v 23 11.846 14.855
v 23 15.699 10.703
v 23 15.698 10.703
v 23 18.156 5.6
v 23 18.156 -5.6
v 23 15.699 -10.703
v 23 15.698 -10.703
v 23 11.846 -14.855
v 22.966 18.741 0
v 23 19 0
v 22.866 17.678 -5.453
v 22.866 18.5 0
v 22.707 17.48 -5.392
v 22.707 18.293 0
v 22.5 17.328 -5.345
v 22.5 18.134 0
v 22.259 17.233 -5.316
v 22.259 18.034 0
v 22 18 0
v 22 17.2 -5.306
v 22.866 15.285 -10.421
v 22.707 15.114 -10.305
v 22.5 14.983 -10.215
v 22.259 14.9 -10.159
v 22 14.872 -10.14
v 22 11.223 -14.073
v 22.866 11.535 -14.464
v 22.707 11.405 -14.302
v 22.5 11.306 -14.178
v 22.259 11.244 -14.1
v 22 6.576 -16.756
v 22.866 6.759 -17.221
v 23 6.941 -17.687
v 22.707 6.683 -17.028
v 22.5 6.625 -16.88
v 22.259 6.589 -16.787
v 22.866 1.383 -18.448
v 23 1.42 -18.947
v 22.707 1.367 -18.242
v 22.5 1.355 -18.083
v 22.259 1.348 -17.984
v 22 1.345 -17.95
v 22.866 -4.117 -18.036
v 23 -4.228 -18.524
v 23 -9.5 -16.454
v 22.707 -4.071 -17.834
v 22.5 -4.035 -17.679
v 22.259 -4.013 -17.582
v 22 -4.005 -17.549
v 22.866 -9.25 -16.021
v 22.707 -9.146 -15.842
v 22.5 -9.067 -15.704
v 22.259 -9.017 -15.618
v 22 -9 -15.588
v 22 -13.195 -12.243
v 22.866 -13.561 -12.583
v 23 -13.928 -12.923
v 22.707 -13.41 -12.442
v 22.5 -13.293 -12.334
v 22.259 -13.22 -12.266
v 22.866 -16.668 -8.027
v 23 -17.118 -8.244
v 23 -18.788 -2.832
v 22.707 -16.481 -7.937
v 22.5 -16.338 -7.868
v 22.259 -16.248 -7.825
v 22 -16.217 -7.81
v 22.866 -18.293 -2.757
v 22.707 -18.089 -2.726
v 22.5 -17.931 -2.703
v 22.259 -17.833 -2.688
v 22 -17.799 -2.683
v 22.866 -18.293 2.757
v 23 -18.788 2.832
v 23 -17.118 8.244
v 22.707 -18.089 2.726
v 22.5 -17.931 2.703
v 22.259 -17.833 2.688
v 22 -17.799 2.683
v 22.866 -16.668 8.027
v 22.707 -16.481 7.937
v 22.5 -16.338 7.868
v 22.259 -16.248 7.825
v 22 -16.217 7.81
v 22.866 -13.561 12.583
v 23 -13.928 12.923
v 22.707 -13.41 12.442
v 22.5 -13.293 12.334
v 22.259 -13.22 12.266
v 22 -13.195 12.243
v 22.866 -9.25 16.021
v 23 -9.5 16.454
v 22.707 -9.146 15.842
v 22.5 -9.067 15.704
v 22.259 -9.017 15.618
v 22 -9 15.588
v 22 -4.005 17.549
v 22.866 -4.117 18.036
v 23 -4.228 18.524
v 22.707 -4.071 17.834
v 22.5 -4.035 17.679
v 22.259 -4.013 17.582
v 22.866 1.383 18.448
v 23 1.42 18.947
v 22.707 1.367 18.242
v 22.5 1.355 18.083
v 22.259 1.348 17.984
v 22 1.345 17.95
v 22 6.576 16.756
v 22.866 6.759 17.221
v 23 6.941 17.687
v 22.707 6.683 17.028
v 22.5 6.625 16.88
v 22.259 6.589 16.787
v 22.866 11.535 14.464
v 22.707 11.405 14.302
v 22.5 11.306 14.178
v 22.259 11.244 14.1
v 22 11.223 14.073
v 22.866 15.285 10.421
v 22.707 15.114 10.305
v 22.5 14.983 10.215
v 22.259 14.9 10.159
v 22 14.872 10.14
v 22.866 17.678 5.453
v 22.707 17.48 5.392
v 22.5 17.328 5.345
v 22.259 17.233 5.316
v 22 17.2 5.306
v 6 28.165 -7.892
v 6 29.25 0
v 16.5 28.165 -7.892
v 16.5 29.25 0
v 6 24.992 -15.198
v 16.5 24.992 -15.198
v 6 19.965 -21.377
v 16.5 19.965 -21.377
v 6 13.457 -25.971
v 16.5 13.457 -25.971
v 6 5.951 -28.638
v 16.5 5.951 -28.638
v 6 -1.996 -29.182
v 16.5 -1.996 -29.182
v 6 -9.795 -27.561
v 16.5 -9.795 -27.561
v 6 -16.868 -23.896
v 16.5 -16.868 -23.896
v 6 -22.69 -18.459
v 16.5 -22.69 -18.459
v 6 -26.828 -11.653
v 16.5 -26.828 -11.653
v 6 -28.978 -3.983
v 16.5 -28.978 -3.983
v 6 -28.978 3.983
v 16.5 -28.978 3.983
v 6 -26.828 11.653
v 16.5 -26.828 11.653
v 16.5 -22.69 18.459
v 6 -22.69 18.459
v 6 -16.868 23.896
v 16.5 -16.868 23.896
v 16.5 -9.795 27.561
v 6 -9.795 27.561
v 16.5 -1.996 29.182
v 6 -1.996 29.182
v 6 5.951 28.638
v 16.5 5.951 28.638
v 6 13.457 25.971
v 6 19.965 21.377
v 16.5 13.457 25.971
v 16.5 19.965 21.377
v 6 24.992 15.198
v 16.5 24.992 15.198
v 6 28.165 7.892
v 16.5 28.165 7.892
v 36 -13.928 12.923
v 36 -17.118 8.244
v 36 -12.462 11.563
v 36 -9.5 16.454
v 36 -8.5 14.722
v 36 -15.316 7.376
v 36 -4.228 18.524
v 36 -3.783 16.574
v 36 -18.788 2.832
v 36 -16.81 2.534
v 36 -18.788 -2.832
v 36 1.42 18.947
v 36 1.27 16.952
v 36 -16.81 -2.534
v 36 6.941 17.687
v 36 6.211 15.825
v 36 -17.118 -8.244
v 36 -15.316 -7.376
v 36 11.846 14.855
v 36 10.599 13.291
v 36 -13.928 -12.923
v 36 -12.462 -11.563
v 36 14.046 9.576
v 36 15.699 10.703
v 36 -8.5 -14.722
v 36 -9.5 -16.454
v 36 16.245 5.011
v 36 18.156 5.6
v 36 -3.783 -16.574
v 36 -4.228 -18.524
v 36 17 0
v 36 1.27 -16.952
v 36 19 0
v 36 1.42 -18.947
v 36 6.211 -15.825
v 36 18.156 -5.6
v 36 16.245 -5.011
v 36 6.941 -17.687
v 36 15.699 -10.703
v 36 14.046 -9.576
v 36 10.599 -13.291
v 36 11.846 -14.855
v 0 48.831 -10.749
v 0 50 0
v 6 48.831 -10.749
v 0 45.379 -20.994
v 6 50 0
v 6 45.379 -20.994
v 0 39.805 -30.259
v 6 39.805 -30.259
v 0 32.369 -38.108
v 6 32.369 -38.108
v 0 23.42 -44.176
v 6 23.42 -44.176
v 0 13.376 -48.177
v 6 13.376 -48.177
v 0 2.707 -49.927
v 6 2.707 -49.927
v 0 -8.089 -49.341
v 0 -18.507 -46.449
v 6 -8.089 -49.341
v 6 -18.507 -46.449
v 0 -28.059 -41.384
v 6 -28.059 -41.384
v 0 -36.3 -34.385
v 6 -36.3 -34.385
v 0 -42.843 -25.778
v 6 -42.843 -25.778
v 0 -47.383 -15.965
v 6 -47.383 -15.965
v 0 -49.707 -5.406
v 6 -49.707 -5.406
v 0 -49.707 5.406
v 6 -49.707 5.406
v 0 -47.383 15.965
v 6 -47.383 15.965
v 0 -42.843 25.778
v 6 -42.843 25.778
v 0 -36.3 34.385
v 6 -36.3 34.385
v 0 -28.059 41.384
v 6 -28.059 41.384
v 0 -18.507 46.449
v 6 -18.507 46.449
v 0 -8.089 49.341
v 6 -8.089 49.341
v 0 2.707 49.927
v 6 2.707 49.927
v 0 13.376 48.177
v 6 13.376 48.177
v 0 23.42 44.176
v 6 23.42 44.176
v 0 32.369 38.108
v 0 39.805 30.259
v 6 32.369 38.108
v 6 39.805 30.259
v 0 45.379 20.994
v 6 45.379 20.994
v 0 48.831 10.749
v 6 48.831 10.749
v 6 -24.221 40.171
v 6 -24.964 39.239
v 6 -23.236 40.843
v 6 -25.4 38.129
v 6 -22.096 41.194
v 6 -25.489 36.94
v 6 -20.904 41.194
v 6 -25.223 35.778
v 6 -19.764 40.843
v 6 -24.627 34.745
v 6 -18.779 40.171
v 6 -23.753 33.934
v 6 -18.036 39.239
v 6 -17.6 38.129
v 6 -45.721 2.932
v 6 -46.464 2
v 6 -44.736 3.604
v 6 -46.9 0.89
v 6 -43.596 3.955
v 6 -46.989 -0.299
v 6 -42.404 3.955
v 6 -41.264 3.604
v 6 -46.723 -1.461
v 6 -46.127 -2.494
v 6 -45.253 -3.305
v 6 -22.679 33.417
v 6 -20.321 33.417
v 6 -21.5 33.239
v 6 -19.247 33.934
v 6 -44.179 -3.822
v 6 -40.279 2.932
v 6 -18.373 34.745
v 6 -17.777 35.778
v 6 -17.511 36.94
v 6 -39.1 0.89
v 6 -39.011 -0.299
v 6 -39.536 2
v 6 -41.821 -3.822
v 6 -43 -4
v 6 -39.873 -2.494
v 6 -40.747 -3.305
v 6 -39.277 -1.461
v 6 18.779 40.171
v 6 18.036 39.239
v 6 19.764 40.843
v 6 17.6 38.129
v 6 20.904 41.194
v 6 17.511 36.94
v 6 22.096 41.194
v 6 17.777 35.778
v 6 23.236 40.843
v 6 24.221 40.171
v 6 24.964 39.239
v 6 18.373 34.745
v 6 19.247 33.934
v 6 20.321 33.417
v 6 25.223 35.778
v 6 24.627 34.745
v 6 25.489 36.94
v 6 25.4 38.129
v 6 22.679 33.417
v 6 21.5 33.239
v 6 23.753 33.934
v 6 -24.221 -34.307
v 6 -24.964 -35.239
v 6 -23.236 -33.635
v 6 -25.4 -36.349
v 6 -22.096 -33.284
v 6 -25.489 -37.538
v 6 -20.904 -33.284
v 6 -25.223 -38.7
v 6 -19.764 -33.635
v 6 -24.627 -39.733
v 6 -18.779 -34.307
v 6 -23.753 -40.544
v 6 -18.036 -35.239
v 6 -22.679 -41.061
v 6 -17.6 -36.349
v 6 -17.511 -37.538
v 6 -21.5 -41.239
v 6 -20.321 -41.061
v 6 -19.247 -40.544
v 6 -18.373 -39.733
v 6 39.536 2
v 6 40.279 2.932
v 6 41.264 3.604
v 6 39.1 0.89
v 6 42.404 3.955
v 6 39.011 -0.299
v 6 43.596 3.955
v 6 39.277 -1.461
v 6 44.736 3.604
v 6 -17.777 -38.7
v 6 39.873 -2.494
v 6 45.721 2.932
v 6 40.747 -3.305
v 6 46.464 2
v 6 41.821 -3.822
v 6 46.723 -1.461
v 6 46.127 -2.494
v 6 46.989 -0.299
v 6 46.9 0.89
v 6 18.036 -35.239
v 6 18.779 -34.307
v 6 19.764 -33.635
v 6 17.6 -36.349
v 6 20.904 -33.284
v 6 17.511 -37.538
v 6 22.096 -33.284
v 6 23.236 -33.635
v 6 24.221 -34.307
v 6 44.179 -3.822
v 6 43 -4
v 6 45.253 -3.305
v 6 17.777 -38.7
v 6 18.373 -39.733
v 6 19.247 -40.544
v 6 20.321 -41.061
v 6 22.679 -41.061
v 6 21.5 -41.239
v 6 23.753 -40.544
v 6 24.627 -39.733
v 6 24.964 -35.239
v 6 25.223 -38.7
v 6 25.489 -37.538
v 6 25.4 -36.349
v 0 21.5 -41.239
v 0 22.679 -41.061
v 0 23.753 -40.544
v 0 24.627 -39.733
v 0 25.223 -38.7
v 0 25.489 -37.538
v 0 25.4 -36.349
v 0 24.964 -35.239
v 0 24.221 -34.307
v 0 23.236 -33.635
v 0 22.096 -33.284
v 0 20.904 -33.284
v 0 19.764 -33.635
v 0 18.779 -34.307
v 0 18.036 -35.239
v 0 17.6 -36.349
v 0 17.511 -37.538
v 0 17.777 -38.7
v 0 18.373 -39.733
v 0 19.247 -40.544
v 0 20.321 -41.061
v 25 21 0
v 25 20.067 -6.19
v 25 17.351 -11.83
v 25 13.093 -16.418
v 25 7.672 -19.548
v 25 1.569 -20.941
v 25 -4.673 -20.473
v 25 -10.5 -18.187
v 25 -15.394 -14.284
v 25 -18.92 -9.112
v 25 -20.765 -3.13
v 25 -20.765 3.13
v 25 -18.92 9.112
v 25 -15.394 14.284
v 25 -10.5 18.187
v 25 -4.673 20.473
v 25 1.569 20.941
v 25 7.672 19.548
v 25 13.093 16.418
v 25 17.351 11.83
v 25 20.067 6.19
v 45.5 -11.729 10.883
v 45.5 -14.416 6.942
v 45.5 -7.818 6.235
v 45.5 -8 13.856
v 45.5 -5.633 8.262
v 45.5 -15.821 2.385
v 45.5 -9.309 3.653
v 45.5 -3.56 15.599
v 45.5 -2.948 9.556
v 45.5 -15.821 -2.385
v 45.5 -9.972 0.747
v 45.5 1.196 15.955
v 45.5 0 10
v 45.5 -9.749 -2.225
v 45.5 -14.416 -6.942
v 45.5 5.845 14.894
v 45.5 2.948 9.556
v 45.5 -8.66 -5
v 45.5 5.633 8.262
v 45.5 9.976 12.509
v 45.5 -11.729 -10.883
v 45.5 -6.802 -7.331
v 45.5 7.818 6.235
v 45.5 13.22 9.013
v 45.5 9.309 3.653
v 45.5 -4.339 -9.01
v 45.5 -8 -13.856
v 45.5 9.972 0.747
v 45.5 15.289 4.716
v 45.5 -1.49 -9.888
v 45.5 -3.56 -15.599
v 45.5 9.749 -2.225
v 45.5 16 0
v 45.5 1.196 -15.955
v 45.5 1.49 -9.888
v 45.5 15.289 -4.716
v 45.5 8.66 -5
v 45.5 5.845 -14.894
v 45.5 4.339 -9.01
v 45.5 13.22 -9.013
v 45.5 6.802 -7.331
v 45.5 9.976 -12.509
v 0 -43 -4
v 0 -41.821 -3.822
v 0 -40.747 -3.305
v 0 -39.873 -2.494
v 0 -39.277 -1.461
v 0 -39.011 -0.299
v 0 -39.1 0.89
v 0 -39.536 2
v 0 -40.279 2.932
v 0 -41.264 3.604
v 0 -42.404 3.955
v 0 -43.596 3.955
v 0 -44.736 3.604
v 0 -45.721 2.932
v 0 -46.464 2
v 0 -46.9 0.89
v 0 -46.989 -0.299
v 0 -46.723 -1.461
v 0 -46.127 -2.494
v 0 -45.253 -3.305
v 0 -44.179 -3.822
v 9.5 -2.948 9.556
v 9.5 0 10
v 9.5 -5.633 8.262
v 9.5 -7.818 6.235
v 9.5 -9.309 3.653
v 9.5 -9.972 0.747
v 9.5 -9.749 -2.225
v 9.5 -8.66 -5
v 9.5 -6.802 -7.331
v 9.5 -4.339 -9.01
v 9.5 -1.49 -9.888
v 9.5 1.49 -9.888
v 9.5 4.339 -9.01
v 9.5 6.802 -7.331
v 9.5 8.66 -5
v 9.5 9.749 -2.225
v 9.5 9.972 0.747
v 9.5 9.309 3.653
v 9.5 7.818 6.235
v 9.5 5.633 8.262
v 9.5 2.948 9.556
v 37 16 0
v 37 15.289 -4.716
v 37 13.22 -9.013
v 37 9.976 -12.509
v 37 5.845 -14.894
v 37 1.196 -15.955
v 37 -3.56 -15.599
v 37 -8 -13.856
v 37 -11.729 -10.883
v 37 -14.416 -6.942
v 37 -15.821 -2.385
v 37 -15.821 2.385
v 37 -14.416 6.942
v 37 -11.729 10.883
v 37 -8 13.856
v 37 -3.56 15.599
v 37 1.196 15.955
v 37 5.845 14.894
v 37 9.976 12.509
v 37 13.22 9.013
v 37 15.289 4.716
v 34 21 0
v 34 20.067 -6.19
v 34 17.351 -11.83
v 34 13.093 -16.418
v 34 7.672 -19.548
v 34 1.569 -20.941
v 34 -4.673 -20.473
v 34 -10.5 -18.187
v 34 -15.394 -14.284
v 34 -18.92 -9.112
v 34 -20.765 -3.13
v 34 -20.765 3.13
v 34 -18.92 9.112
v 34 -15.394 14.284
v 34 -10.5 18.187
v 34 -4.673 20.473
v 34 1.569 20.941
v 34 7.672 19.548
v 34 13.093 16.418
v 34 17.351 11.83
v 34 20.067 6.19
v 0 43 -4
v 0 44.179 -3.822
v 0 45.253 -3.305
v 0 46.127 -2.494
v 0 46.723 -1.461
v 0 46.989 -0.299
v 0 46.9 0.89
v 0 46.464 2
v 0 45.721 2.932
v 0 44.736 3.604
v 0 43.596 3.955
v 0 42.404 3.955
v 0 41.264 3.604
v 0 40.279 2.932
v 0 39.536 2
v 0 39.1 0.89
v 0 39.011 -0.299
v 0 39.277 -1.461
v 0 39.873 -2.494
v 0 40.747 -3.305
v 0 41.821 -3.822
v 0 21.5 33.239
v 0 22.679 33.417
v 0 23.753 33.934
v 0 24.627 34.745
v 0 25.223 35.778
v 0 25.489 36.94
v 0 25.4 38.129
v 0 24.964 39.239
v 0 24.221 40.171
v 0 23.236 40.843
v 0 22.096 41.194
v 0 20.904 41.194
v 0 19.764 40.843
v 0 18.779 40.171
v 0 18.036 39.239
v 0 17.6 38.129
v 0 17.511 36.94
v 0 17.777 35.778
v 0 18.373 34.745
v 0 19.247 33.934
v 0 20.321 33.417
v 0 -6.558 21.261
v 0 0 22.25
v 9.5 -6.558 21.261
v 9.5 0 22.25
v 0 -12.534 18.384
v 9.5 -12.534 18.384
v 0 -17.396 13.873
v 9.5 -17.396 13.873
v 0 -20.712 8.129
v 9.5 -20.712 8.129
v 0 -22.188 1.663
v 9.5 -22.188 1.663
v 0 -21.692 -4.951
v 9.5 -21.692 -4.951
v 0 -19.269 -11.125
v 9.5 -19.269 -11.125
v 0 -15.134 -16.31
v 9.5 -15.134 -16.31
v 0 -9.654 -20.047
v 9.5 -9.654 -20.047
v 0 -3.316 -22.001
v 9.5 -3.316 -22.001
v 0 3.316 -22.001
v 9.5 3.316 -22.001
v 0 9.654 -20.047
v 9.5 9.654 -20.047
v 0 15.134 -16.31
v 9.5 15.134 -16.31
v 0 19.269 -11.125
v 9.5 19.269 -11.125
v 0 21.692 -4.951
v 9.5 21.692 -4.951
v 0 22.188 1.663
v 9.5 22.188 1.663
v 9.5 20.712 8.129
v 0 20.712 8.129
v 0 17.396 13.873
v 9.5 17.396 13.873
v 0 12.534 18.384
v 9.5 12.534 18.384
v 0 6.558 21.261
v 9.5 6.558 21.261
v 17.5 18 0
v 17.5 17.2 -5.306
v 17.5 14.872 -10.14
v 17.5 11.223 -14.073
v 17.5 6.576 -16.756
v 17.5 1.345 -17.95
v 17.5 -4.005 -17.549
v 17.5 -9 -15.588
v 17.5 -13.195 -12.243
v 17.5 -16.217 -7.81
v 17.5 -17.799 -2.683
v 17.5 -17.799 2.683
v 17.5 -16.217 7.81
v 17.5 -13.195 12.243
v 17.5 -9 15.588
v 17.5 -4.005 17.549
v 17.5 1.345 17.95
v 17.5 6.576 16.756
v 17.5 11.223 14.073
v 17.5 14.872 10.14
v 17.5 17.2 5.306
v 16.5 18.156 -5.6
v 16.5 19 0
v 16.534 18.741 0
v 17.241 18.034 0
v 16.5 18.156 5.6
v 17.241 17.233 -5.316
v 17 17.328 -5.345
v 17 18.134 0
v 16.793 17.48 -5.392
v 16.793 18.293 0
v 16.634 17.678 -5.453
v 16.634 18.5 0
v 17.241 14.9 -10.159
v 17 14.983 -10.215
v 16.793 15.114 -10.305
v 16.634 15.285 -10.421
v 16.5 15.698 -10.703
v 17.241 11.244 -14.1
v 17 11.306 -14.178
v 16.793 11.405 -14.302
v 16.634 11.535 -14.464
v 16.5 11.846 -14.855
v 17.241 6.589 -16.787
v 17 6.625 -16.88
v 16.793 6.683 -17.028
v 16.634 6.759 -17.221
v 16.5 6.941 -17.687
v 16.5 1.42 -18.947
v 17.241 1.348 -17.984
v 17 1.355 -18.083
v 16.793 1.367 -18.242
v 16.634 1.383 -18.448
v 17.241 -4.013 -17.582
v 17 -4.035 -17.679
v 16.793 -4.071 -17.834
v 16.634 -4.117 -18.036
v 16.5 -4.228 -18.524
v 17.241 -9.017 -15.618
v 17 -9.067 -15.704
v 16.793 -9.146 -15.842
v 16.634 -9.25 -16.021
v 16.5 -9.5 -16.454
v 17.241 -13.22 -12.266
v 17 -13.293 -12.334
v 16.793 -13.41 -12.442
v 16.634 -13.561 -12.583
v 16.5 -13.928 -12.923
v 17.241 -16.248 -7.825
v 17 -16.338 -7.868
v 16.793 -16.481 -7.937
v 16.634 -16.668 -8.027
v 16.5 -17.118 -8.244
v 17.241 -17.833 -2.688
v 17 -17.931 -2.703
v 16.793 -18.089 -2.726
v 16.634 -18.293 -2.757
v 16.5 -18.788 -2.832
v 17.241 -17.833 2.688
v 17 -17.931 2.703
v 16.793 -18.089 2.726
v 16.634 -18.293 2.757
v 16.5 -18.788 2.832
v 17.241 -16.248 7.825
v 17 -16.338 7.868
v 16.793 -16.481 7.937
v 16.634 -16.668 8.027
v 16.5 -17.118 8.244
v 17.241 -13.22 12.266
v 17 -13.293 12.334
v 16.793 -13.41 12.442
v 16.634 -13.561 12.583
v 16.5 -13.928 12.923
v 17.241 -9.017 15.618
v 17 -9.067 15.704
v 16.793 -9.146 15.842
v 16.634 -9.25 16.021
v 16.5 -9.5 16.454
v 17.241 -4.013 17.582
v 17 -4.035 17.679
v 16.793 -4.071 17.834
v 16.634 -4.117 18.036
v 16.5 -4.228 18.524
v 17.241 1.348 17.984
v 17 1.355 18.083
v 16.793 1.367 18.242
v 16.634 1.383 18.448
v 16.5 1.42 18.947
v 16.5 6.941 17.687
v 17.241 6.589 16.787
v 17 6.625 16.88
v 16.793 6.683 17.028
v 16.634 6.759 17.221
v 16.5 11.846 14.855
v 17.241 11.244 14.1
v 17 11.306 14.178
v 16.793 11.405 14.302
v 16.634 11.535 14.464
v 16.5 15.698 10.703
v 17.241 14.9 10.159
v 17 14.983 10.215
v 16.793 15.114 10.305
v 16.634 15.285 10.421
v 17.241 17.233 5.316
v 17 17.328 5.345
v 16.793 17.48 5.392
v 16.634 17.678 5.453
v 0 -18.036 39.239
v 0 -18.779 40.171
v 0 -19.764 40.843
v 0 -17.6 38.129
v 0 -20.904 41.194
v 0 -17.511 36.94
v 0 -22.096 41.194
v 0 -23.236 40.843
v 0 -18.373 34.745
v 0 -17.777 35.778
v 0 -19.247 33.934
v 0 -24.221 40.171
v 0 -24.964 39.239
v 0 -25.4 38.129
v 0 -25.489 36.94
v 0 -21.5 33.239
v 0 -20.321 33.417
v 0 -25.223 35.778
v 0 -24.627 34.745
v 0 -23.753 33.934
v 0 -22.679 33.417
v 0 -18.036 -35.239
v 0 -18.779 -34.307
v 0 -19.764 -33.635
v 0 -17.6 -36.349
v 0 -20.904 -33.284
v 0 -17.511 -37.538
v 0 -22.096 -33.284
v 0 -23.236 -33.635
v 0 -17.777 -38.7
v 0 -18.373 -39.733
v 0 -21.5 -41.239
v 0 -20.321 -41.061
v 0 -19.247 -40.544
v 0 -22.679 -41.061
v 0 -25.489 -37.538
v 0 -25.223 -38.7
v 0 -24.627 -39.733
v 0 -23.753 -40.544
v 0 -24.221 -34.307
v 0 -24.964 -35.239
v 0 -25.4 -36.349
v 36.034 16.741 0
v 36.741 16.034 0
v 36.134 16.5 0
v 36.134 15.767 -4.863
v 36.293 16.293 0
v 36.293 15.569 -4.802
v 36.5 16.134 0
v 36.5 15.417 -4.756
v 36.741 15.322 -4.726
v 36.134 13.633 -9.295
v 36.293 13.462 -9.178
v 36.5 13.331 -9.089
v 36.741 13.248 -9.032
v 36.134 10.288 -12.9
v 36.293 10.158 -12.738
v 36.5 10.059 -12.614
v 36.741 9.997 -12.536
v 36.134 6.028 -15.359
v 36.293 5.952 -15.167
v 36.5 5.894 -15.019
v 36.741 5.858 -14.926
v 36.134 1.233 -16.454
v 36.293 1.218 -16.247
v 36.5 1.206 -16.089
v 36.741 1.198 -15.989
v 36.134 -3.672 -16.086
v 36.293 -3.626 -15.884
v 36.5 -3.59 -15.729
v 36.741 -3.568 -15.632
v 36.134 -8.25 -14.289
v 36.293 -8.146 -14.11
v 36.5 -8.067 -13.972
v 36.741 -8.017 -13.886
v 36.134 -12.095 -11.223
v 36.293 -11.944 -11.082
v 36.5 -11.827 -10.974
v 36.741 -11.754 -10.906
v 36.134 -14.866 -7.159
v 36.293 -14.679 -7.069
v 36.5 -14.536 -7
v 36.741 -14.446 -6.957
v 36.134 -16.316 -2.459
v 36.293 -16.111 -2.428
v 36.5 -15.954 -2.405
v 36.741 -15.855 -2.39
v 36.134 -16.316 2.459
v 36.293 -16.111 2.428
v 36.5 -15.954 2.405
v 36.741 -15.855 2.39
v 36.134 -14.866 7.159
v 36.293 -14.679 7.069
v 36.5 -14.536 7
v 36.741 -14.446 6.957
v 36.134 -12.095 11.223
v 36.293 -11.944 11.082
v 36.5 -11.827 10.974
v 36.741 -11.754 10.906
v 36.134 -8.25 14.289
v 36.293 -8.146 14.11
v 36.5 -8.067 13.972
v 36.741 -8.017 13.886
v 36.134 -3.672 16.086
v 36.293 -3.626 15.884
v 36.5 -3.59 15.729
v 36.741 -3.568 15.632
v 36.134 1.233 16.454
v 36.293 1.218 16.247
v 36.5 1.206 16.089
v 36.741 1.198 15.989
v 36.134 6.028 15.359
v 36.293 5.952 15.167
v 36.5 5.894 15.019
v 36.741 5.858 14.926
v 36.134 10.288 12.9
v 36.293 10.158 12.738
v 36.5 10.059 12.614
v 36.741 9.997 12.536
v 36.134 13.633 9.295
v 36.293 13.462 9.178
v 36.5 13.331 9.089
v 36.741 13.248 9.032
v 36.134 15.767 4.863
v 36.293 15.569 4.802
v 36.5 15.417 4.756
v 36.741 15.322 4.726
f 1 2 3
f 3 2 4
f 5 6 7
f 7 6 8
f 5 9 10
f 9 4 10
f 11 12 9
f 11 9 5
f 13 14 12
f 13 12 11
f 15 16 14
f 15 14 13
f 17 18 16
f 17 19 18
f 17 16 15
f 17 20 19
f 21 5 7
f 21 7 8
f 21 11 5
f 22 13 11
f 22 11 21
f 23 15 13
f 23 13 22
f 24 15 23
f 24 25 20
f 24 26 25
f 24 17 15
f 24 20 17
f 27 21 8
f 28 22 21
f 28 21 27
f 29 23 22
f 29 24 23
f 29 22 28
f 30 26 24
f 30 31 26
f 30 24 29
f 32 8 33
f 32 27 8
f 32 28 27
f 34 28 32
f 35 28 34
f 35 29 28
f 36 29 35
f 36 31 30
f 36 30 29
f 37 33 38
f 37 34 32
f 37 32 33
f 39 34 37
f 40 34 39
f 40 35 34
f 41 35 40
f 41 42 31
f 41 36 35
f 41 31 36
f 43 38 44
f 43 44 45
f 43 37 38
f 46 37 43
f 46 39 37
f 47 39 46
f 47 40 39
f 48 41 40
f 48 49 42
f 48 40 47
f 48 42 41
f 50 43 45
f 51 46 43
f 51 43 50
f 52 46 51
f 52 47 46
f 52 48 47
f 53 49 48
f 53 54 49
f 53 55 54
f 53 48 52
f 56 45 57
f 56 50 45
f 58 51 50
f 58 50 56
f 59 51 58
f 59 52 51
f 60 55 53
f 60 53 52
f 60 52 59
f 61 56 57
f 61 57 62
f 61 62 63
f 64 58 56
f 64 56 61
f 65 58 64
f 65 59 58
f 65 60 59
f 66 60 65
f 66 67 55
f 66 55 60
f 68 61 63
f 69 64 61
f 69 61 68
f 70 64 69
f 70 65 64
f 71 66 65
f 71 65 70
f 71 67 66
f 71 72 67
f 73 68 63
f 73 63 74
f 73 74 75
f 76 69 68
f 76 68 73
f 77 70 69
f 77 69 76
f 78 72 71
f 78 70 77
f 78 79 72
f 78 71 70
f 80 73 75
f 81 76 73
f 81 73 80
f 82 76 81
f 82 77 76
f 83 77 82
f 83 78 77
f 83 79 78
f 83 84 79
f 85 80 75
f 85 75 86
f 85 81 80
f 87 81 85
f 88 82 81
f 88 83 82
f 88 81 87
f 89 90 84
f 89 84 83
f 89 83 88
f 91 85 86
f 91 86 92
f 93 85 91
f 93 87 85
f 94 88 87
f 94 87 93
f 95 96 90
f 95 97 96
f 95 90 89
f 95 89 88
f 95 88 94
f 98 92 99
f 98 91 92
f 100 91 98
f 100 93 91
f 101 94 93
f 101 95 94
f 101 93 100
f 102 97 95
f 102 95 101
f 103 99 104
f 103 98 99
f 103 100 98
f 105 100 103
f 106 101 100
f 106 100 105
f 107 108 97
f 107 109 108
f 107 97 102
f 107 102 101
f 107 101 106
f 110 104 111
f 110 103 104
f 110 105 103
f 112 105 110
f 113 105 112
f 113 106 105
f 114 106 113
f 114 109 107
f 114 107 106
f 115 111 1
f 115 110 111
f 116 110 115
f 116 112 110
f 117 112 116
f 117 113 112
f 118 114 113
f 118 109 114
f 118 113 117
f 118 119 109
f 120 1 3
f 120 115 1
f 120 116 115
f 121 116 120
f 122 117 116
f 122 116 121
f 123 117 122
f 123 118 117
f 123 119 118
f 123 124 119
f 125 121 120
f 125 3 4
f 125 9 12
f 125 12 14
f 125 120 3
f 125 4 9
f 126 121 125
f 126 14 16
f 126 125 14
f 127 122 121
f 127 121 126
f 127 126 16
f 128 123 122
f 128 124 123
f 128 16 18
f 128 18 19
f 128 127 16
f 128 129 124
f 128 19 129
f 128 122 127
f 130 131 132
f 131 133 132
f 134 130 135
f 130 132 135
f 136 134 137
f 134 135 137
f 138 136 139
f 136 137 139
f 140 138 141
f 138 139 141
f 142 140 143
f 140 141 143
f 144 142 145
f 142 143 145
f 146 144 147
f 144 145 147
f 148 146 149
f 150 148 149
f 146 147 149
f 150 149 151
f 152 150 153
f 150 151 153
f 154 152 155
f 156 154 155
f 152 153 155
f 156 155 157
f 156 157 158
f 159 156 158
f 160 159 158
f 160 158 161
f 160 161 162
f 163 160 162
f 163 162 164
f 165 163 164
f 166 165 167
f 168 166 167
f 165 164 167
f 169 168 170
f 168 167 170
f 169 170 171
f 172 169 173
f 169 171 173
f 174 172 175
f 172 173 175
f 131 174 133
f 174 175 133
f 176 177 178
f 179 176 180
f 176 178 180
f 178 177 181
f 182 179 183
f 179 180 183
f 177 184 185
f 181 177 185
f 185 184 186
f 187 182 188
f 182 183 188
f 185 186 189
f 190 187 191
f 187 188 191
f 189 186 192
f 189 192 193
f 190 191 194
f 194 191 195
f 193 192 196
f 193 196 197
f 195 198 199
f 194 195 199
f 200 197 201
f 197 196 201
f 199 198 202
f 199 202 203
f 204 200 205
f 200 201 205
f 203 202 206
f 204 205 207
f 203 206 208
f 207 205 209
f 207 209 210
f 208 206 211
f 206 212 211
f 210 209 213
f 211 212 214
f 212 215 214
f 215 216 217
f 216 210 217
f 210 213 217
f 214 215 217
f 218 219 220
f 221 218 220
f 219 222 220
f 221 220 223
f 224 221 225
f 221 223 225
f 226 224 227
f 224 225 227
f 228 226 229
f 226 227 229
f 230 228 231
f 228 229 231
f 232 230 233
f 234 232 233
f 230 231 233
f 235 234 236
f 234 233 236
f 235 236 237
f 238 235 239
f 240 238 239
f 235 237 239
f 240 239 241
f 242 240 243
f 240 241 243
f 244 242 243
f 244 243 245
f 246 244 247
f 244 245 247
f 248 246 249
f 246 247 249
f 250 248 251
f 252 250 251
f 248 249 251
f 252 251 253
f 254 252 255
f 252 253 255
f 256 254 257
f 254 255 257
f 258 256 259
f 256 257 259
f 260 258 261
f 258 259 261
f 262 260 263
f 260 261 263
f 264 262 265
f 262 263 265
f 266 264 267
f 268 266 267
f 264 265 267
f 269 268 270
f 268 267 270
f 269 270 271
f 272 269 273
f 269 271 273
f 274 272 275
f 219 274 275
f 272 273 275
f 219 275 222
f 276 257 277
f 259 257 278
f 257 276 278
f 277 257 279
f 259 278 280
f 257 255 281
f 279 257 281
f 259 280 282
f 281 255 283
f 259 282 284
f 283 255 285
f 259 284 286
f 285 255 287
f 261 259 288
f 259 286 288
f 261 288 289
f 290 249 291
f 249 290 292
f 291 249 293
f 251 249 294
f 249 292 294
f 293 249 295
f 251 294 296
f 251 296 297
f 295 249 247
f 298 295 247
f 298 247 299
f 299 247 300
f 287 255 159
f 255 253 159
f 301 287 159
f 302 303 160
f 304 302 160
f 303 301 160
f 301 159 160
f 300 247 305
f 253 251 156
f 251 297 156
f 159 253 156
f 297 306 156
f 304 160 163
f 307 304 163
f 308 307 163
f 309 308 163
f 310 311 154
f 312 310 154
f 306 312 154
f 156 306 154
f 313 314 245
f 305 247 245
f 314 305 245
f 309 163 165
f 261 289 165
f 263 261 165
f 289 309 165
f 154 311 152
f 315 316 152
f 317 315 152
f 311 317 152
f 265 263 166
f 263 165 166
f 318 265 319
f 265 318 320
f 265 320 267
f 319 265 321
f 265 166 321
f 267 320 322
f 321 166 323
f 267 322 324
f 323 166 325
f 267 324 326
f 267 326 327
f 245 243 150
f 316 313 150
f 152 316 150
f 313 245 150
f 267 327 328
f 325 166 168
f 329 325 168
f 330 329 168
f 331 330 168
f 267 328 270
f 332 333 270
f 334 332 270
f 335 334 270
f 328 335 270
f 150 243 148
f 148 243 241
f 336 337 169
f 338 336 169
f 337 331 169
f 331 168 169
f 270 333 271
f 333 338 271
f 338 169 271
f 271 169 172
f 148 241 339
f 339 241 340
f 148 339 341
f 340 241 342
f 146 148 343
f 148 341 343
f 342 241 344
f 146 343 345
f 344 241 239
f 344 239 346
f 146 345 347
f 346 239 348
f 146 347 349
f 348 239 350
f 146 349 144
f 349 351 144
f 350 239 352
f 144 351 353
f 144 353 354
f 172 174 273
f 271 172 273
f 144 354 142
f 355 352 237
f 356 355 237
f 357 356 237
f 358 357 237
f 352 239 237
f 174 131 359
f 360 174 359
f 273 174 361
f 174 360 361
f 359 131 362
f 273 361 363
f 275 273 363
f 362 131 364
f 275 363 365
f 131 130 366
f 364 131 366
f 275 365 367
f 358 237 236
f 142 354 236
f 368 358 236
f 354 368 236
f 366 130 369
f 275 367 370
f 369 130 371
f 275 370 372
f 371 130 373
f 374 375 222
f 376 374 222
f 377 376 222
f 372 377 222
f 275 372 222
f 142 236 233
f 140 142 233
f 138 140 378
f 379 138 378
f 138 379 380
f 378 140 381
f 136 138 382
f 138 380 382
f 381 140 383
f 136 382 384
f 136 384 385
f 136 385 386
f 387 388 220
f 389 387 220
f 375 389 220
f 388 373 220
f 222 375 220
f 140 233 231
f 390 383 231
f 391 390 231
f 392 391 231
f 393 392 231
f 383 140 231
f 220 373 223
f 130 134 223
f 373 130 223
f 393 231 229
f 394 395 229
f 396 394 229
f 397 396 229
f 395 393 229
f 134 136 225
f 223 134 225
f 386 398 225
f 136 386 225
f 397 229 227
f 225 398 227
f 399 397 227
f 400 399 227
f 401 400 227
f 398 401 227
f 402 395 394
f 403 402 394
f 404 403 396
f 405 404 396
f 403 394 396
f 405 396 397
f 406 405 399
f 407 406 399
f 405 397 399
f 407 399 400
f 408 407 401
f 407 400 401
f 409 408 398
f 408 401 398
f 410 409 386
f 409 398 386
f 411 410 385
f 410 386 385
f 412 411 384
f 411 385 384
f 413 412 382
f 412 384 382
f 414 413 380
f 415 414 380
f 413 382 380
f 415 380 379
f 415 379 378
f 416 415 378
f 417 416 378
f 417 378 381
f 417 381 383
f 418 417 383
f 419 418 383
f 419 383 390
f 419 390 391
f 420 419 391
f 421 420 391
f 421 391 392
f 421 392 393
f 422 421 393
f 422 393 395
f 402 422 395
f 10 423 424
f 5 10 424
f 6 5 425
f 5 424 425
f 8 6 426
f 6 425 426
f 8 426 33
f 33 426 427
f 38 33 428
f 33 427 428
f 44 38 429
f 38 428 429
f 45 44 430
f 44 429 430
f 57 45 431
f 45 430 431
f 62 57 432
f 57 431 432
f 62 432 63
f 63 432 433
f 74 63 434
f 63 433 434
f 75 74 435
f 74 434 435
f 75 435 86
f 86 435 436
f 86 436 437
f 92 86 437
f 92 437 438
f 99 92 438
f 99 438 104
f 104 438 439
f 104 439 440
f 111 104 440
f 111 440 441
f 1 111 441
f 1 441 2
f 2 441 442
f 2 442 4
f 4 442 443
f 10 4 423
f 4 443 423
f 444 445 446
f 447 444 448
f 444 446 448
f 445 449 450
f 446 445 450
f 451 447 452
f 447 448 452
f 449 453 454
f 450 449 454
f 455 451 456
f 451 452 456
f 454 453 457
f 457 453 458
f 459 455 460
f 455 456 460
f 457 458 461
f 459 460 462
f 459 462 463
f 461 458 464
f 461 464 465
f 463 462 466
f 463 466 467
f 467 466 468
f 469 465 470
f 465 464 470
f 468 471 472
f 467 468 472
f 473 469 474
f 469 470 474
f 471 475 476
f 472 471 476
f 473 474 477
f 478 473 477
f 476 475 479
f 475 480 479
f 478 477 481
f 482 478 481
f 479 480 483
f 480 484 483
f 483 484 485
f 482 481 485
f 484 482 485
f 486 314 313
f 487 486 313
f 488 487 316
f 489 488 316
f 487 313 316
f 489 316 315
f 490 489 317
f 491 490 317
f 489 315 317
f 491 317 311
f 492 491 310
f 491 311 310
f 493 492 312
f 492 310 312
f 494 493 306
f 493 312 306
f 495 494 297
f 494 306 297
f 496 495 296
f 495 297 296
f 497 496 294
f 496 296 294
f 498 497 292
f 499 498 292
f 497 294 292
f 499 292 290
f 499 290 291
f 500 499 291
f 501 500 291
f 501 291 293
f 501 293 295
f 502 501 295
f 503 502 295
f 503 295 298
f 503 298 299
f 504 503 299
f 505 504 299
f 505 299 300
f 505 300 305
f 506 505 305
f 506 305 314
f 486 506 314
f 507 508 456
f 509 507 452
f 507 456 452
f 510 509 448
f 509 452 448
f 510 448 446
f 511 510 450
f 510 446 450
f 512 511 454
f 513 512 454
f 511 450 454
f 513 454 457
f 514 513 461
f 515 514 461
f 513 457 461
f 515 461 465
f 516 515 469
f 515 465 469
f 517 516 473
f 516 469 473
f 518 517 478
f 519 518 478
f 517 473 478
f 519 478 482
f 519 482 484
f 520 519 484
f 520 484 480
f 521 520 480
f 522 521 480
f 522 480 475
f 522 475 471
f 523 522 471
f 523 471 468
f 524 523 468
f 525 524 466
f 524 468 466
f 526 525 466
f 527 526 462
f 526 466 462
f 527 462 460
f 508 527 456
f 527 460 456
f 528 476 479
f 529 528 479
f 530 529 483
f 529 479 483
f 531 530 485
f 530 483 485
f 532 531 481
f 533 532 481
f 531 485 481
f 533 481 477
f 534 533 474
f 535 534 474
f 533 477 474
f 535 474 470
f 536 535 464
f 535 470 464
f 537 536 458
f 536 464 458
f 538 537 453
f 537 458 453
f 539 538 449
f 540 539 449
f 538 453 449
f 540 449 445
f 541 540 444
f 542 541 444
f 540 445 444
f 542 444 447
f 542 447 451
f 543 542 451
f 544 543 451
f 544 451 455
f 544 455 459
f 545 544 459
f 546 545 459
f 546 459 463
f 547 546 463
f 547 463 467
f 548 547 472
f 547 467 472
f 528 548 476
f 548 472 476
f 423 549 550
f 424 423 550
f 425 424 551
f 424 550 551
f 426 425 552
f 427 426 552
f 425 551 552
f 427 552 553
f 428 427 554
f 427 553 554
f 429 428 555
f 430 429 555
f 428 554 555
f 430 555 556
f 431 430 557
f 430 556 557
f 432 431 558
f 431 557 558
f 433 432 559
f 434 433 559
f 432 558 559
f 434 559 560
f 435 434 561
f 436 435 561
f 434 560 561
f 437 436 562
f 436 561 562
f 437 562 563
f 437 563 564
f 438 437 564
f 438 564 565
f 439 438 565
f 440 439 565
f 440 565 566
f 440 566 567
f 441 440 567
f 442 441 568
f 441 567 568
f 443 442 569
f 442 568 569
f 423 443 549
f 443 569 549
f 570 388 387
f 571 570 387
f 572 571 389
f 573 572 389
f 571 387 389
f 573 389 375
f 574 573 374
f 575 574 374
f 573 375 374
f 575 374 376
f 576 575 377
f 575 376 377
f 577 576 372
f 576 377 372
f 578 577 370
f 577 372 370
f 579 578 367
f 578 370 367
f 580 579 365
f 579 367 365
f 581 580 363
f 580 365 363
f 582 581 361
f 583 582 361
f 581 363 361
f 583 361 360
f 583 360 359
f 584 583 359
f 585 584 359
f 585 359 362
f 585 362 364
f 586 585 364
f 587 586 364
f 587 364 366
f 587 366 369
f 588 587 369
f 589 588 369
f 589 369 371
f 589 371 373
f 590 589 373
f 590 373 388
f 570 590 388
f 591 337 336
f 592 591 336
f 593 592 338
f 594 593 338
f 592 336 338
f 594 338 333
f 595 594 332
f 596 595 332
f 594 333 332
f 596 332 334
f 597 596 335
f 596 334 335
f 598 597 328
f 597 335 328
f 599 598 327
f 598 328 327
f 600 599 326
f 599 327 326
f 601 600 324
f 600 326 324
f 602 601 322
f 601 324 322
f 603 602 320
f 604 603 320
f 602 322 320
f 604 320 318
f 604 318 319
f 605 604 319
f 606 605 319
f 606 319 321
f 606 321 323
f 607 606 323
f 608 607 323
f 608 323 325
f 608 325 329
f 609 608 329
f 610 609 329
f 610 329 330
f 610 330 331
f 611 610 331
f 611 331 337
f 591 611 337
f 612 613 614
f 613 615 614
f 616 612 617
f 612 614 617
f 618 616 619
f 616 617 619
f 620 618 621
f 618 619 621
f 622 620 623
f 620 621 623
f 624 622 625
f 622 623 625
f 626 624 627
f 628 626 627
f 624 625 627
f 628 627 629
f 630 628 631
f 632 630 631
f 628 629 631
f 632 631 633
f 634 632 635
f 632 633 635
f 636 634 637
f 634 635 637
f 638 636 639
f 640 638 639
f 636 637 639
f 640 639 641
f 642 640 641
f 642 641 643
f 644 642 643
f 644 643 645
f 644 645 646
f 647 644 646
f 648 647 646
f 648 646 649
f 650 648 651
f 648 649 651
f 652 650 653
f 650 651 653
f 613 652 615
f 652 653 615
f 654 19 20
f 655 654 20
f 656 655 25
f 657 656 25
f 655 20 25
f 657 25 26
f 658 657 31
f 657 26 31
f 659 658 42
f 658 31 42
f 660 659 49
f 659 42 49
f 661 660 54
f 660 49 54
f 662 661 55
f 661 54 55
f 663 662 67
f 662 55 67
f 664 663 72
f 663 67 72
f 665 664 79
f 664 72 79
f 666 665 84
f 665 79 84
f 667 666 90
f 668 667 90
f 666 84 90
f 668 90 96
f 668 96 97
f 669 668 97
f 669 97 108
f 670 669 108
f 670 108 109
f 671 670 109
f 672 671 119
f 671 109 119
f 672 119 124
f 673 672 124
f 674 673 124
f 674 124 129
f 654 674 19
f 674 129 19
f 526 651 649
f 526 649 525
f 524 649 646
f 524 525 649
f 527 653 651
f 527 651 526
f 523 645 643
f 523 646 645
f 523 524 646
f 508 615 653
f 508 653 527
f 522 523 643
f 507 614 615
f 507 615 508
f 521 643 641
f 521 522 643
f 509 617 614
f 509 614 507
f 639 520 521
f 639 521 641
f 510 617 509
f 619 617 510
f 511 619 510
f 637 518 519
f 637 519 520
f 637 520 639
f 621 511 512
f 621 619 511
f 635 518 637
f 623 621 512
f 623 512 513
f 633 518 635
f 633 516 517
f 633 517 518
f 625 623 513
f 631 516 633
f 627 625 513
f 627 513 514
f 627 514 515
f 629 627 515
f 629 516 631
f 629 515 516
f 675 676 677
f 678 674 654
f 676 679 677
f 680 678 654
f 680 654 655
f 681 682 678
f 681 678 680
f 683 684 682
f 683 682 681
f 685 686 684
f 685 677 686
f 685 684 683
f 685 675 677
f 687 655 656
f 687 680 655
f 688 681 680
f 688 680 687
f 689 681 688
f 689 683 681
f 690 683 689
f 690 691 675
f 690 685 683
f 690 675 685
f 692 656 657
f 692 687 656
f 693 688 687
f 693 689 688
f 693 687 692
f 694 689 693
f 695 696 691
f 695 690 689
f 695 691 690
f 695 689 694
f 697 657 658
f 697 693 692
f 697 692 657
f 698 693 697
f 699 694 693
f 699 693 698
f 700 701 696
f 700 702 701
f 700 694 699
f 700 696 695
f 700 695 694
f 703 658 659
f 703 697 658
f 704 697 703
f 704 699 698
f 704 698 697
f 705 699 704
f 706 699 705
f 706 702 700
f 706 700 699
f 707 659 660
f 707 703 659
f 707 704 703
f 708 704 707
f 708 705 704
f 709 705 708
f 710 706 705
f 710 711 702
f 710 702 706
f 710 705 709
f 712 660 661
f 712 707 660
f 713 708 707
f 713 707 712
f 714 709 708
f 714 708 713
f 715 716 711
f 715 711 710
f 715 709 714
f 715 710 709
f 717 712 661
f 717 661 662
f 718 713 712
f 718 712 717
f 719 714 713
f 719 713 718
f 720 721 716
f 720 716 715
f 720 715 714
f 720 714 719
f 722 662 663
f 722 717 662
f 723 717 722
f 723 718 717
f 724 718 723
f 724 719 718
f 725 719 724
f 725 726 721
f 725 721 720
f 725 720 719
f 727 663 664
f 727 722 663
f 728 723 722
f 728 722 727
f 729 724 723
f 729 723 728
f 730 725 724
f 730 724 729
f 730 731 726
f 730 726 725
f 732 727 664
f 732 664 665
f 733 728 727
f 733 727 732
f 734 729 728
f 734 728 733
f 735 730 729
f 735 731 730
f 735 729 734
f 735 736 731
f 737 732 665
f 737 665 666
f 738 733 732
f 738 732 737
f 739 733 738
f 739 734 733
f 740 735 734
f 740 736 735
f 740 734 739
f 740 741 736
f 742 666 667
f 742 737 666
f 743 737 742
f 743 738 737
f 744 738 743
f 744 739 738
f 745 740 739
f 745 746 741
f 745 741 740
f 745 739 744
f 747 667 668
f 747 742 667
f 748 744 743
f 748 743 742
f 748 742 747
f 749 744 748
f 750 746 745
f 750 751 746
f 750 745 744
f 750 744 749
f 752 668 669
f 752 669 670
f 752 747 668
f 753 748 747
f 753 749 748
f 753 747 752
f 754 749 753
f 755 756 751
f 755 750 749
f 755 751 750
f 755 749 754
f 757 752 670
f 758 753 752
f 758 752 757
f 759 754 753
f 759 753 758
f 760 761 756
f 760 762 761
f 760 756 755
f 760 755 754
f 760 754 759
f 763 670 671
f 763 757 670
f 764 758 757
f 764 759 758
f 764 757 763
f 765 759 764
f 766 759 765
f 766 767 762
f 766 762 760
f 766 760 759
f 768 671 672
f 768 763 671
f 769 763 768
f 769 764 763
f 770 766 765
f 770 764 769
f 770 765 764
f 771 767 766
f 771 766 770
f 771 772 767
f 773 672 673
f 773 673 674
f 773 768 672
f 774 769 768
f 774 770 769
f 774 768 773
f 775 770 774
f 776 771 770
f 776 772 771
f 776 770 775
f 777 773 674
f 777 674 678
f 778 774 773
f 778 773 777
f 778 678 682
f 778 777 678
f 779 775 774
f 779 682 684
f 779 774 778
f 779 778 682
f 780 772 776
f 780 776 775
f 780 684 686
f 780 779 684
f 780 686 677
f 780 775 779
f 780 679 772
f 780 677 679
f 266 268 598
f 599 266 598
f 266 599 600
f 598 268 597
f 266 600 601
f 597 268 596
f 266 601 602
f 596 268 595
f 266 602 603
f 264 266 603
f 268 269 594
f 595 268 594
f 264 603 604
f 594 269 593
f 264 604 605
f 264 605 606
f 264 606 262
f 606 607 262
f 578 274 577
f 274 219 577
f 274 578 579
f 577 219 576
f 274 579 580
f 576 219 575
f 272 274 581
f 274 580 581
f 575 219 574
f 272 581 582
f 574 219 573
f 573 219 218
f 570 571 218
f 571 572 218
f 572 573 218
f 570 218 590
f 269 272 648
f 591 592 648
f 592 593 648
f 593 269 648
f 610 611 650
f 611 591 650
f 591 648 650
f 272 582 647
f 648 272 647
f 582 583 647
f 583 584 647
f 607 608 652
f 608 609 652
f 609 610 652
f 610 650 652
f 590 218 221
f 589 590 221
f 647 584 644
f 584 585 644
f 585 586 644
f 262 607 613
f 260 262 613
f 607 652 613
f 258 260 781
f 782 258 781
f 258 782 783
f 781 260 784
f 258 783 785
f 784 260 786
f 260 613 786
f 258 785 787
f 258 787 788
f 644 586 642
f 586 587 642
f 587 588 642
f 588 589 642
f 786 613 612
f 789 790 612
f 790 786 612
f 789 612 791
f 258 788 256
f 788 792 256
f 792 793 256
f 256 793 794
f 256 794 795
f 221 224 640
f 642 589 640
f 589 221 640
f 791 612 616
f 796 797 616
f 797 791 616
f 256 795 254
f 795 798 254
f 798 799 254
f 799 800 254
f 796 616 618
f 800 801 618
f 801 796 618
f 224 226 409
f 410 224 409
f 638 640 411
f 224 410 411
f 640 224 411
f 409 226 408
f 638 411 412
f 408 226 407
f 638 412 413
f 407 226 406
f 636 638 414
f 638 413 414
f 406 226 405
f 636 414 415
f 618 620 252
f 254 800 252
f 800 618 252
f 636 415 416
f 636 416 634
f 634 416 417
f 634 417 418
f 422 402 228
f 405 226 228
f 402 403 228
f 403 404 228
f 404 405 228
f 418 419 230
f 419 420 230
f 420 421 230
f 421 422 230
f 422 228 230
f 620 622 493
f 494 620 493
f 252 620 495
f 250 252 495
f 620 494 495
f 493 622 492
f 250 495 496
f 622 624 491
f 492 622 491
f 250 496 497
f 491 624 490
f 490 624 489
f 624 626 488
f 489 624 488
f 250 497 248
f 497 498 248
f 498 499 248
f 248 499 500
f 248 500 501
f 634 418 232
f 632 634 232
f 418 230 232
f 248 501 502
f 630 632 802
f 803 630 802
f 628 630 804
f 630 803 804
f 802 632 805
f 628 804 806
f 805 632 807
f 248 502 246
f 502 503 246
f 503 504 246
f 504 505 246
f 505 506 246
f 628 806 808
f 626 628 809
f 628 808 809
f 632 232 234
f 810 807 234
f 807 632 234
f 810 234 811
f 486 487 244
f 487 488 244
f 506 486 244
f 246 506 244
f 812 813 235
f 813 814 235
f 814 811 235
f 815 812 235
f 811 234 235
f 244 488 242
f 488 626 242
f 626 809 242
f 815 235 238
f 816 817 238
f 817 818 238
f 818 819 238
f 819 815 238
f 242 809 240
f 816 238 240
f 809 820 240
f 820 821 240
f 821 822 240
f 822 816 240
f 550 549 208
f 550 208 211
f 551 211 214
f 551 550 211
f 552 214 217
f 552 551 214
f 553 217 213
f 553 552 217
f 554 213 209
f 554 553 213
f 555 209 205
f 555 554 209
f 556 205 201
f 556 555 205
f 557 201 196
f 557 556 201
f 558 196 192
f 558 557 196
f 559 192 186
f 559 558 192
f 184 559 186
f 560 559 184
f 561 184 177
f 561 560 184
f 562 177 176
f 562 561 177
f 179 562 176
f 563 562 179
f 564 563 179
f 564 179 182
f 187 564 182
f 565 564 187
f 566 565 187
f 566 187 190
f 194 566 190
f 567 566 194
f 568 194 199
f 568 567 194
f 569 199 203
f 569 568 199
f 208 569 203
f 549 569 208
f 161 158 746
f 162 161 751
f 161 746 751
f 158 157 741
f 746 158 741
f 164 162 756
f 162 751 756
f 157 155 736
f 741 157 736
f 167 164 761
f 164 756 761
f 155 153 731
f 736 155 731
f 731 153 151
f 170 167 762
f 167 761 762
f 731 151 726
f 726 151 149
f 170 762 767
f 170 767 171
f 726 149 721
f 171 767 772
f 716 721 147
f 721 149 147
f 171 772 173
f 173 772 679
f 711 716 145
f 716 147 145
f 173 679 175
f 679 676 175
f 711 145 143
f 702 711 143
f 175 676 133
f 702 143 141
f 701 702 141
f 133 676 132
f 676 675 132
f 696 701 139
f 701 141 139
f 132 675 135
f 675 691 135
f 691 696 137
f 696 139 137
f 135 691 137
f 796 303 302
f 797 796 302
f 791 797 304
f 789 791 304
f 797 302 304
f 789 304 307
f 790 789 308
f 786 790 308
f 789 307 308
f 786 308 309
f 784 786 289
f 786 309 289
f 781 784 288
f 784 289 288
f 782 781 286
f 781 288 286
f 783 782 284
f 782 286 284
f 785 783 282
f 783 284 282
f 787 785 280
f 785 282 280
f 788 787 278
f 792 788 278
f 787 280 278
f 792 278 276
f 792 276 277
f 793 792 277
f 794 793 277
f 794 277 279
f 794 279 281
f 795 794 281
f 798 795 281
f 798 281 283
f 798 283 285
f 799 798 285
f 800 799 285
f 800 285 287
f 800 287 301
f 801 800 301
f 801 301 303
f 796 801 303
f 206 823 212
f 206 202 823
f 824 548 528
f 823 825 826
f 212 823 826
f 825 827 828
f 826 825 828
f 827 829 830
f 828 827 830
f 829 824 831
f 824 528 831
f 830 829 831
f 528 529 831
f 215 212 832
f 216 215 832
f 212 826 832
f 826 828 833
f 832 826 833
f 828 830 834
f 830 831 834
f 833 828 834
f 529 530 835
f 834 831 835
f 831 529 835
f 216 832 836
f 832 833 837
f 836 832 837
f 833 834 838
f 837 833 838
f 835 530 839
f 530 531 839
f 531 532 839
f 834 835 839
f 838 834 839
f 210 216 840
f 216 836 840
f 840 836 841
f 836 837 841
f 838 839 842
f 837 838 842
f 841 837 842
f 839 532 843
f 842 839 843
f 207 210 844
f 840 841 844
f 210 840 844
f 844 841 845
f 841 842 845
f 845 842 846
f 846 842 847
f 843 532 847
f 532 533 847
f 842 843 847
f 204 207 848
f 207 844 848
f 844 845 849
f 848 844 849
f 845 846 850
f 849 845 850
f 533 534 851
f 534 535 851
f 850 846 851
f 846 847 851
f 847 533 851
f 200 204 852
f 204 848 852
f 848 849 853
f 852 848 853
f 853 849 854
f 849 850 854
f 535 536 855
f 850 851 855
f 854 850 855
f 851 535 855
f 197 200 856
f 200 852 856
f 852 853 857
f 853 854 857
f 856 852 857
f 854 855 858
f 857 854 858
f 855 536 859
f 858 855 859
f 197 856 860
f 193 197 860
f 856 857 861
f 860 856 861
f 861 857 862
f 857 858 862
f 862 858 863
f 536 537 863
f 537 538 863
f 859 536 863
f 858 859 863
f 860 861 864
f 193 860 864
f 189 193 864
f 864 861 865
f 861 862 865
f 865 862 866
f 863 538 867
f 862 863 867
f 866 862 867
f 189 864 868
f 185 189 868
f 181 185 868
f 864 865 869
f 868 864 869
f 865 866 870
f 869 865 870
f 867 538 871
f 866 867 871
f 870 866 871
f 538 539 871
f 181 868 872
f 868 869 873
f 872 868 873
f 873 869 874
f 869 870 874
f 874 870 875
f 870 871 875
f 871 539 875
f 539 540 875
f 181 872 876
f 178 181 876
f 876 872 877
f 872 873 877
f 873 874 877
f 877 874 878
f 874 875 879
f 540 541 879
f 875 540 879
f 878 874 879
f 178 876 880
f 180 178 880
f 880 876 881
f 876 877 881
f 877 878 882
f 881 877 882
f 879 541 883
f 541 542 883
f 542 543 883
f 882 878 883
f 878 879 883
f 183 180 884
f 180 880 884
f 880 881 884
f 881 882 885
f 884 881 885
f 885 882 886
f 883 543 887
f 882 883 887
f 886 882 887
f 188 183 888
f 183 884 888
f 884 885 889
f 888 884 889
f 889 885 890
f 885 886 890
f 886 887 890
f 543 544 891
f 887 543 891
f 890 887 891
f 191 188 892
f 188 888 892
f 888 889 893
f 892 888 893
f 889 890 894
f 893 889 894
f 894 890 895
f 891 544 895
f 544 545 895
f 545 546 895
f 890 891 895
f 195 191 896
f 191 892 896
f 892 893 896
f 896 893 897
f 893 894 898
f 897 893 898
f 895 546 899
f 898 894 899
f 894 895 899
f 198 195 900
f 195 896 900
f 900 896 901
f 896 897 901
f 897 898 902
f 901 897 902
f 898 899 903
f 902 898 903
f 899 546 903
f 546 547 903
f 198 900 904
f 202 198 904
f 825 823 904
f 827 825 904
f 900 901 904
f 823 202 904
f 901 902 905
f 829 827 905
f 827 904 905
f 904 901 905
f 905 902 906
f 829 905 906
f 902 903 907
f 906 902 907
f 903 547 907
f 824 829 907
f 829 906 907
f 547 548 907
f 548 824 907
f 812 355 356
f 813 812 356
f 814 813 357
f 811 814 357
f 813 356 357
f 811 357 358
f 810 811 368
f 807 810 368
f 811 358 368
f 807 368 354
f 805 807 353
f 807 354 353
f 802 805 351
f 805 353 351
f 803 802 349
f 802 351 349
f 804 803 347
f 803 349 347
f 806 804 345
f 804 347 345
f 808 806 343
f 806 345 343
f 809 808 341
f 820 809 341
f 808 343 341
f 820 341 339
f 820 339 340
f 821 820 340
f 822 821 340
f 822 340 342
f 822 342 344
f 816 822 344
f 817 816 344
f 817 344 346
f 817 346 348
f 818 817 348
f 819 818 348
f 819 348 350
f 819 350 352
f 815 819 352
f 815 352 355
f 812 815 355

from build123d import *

# Parameters (mm, degrees)
SKETCH2_W     = 9.5
SKETCH2_H     = 22.25
SKETCH2_W_2   = 36
SKETCH2_H_2   = 10
HOLE1_D       = 8
CHAMFER1_SIZE = 2
FILLET1_R     = 1


with BuildPart() as part:
    # Sketch1 → Revolve1 (revolve)
    with BuildSketch(Plane.XY):
        Polygon((0, 0), (0, 50), (6, 50), (6, 29.25), (16.5, 29.25), (16.5, 18), (23, 18), (23, 21), (36, 21), (36, 16), (45.5, 16), (45.5, 0), align=None)
    revolve(axis=Axis((45.5, 0, 0), (-1, 0, 0)))

    # Sketch2 → Cut-Revolve1 (revolve, cut)
    with BuildSketch(Plane.XY, mode=Mode.PRIVATE) as cut_revolve1_sk:
        with Locations((4.75, 11.125)):
            Rectangle(SKETCH2_W, SKETCH2_H)
        with Locations((27.5, 5)):
            Rectangle(SKETCH2_W_2, SKETCH2_H_2)
    revolve(cut_revolve1_sk.sketch.rotate(Axis((0, 0, 0), (1, 0, 0)), 90), axis=Axis((0, 0, 0), (1, 0, 0)), mode=Mode.SUBTRACT)

    # Hole1 (through all)
    with Locations(Plane.ZY):
        with Locations((0, 0), (0, 43), (37.239092363, 21.5), (37.239092363, -21.5), (0, -43), (-37.239092363, -21.5), (-37.239092363, 21.5)):
            Hole(HOLE1_D / 2)

    # Chamfer1
    chamfer1_edges = [part.edges().sort_by_distance(p)[0] for p in [
        (36, -21, 0),
        (23, -21, 0),
    ]]
    chamfer(chamfer1_edges, length=CHAMFER1_SIZE)

    # Fillet1
    fillet1_edges = [part.edges().sort_by_distance(p)[0] for p in [
        (36, -16, 0),
        (23, -18, 0),
        (16.5, -18, 0),
    ]]
    fillet(fillet1_edges, radius=FILLET1_R - 0.0001)  # a hair under: the kernel refuses the full size


solid = part.part
